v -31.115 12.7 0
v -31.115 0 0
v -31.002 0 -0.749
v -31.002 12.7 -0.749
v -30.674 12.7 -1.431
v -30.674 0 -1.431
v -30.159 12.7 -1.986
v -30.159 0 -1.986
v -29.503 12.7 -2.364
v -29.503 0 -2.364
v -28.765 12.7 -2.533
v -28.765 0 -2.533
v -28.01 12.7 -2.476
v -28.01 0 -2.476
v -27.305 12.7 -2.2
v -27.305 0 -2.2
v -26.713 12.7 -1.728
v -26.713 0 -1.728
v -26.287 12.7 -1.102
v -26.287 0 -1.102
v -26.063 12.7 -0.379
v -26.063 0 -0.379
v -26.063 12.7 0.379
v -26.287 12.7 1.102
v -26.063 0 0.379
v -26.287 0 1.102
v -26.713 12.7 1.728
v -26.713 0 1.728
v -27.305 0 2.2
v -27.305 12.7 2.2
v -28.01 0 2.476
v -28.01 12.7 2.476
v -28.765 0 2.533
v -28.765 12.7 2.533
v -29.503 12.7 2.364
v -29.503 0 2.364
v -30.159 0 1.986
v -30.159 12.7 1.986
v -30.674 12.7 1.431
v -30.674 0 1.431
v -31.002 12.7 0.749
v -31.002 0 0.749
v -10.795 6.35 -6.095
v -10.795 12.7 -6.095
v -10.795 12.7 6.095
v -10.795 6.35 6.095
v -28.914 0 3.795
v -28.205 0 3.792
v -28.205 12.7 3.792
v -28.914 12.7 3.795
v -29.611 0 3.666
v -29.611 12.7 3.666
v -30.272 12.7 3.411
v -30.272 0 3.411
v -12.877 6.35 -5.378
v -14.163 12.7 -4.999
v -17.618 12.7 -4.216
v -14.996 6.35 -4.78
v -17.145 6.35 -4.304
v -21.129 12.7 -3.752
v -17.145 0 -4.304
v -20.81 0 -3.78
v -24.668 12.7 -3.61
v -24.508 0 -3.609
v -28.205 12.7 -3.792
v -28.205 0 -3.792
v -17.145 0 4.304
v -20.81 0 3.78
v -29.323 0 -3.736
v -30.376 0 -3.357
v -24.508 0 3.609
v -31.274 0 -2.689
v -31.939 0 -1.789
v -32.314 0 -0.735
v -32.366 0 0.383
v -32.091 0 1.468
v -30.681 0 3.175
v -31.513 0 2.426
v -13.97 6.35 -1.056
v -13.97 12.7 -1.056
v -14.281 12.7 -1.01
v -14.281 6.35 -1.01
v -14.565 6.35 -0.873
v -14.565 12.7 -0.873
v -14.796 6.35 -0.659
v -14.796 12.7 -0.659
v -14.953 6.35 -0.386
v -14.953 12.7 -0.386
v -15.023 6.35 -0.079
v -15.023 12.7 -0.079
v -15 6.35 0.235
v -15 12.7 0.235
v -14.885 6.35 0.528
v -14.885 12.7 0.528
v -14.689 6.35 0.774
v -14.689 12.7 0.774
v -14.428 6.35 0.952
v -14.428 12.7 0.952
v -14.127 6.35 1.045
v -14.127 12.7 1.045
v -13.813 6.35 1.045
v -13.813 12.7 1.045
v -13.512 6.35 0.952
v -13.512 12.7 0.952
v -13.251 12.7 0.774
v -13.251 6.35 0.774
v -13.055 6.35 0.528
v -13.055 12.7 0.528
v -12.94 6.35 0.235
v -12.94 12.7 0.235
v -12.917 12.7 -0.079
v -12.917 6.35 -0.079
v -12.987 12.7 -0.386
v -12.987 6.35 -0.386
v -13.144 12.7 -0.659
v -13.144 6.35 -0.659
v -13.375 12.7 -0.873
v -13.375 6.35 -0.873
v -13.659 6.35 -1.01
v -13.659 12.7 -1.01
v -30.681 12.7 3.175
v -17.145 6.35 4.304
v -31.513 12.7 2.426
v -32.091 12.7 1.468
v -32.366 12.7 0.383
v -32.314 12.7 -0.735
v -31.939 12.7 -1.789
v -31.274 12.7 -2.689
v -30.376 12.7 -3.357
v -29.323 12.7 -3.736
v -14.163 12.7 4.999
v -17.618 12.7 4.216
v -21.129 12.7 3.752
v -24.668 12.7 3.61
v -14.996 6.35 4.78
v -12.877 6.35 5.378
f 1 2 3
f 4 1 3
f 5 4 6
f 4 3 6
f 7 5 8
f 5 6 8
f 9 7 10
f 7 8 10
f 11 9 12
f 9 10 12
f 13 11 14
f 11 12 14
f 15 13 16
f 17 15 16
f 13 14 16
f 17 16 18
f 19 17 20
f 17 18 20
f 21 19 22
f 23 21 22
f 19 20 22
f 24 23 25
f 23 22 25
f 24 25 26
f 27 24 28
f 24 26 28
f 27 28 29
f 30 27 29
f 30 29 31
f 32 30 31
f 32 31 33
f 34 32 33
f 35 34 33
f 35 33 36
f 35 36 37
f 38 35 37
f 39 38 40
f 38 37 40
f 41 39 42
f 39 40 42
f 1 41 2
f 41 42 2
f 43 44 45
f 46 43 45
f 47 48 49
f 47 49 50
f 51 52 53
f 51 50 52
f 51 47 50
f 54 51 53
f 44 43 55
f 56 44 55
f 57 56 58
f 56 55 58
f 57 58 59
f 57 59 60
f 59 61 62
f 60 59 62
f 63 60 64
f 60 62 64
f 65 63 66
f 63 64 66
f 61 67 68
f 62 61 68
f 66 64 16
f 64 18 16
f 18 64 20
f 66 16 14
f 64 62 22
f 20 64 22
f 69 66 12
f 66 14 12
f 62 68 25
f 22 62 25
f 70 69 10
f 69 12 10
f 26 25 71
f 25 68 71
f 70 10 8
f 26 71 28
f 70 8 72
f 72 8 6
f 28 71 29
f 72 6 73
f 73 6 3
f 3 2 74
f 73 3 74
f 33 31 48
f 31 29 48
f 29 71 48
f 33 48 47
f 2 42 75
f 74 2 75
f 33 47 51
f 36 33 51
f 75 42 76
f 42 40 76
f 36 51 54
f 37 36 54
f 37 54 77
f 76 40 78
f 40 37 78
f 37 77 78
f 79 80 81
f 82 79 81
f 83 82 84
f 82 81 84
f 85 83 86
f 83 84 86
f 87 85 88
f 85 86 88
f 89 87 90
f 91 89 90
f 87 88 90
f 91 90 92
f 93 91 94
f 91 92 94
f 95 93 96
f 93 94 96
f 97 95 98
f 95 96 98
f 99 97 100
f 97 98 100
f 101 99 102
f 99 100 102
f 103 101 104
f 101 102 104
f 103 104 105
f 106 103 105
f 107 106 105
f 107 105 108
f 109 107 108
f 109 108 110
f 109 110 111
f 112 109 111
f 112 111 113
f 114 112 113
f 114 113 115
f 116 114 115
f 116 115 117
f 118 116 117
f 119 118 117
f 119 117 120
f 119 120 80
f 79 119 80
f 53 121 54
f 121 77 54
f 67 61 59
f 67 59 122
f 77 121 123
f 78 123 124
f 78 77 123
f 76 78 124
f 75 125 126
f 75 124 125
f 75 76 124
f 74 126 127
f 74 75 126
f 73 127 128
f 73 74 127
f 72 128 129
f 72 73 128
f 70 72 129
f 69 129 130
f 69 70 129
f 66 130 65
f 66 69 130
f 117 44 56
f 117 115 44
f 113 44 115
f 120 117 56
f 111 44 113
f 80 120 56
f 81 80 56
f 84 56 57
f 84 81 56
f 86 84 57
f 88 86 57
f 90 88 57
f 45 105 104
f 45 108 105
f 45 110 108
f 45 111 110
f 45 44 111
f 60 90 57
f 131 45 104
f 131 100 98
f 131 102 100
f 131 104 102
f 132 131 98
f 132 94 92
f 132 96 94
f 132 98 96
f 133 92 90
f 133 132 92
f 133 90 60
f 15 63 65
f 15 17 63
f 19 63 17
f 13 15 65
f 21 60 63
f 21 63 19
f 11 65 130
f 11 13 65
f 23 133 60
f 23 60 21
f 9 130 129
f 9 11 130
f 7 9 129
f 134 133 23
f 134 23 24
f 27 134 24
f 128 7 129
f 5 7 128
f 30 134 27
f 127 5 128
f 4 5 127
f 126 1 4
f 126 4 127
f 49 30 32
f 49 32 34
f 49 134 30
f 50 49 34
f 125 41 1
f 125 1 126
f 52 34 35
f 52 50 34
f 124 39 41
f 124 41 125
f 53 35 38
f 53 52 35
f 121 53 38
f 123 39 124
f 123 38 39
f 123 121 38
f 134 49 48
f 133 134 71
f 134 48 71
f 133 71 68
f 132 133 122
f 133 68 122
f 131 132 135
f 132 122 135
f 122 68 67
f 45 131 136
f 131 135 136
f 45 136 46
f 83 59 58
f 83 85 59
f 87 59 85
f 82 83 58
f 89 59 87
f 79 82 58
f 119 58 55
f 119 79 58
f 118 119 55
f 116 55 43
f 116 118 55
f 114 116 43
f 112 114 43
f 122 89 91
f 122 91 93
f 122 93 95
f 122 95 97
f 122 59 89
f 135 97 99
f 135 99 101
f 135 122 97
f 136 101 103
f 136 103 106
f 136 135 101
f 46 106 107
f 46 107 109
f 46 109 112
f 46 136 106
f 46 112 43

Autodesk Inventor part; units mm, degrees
ref_plane "YZ Plane" through (0, 0, 0) normal (1, 0, 0) x (0, 1, 0)
ref_plane "XZ Plane" through (0, 0, 0) normal (0, 1, 0) x (-1, 0, 0)
ref_plane "XY Plane" through (0, 0, 0) normal (0, 0, 1) x (1, 0, 0)
sketch "Sketch1" plane through (0, 0, 0) normal (0, 1, 0) x (-1, 0, 0)
  line L0 (0, 0) -> (28.575, 0)
  line L1 (28.575, 0) -> (0, 0)
  line L2 (0, 0) -> (-14.2875, -24.7467)
  line L3 (0, 0) -> (28.575, 0) construction
  line L4 (0, 0) -> (-14.2875, 24.7467)
  line L5 (0, 0) -> (28.575, 0) construction
  circle A0 centre (28.575, 0) radius 2.54
  circle A1 centre (-14.2875, -24.7467) radius 2.54
  circle A2 centre (-14.2875, 24.7467) radius 2.54
  circle A3 centre (0, 0) radius 3.175
  circle A4 centre (0, 0) radius 6.35
  line L6 (-1.5875, -2.7496) -> (0, 0)
  line L7 (0, 0) -> (-6.35, 0)
  circle A5 centre (-14.2875, 24.7467) radius 3.81
  circle A6 centre (28.575, 0) radius 3.81
  circle A7 centre (-14.2875, -24.7467) radius 3.81
  line L8 (30.6811, 3.175) -> (-12.1814, 27.9217)
  line L9 (28.2054, -3.792) -> (-10.8187, -26.3226)
  line L10 (-18.0975, 24.7467) -> (-18.0975, -24.7467)
  line L11 (0, 0) -> (5.0525, -8.8146)
  line L12 (0, 0) -> (5.1463, 8.7602)
  line L13 (0, 0) -> (-10.16, 0)
  arc A8 (28.2054, -3.792) -> (-10.8187, -26.3226) centre (24.4473, -42.344) ccw
  arc A9 (-10.8187, 26.3226) -> (28.2054, 3.792) centre (24.4473, 42.344) ccw
  arc A10 (-17.3867, -22.5305) -> (-17.3867, 22.5305) centre (-48.8947, 0) ccw
  point P0 (5.1074, 8.7829)
  point P1 (-10.16, 0.0317)
  point P2 (30.2716, 3.4114)
  point P3 (28.2054, 3.792)
  point P4 (-10.8187, 26.3226)
  point P5 (-17.3867, 22.5305)
  point P6 (-17.3867, -22.5305)
  dimension "d9" = 6.35
  dimension "d41" = 12.7
  dimension "d0" = 28.575
  dimension "d1" = 28.575
  dimension "d2" = 120
  dimension "d3" = 28.575
  dimension "d4" = 120
  dimension "d5" = 5.08
  dimension "d6" = 5.08
  dimension "d7" = 5.08
  dimension "d42" = 7.62
  dimension "d43" = 7.62
  dimension "d44" = 7.62
  dimension "d47" = 10.16
  dimension "d48" = 10.16
  dimension "d49" = 10.16
  dimension "d52" = 360
extrude "Extrusion4" add sketch "Sketch1" along normal blind 12.7 contours A3 L12 A4 L0 | L0 A4 L11 A3 | A3 L11 A4 L2 | L2 A4 L7 A3 | A3 L7 A4 L4 | L4 A4 L12 A3 | A4 L12 A9 A6 L0 | L0 A6 A8 L11 A4 | A4 L11 A8 A7 L2 | L2 A7 A10 L13 A4 | A4 L13 A10 A5 L4 | L4 A5 A9 L12 A4 | A6 L8 | A7 | A5 picked at (31.8987, 0.5122)
sketch "Sketch21" plane through (0, 12.7, 0) normal (0, 1, 0) x (1, 0, 0)
  circle A0 centre (-28.575, 0) radius 2.54 projected
  arc A1 (-28.2054, 3.792) -> (10.8187, 26.3226) centre (-24.4473, 42.344) ccw projected
  arc A2 (10.8187, -26.3226) -> (-28.2054, -3.792) centre (-24.4473, -42.344) ccw projected
  arc A3 (-28.2054, 3.792) -> (10.8187, 26.3226) centre (-24.4473, 42.344) ccw projected
  arc A4 (-28.2054, 3.792) -> (-30.6811, -3.175) centre (-28.575, 0) ccw projected
  line L0 (-30.6811, -3.175) -> (-30.2716, -3.4114) projected
  arc A5 (-30.2716, -3.4114) -> (-28.2054, -3.792) centre (-28.575, 0) ccw projected
  arc A6 (10.8187, -26.3226) -> (-28.2054, -3.792) centre (-24.4473, -42.344) ccw projected
  arc A7 (10.8187, -26.3226) -> (17.3867, -22.5305) centre (14.2875, -24.7467) ccw projected
  arc A8 (17.3867, 22.5305) -> (17.3867, -22.5305) centre (48.8947, 0) ccw projected
  arc A9 (17.3867, 22.5305) -> (10.8187, 26.3226) centre (14.2875, 24.7467) ccw projected
  circle A10 centre (-28.575, 0) radius 2.54 projected
  circle A11 centre (0, 0) radius 3.175 projected
  circle A12 centre (14.2875, -24.7467) radius 2.54 projected
  circle A13 centre (14.2875, 24.7467) radius 2.54 projected
  line L1 (0, 0) -> (-13.6784, 0)
  line L2 (-13.6784, 0) -> (-28.575, 0)
  line L3 (0, 0) -> (-10.795, 0)
  line L4 (-10.795, 0) -> (-10.795, 6.095)
  arc A14 (-28.2054, 3.792) -> (10.8187, 26.3226) centre (-24.4473, 42.344) ccw projected
  line L5 (-10.795, 0) -> (-10.795, -6.095)
  point P0 (10.8187, -26.3226)
  point P1 (10.8187, 26.3226)
  dimension "d107" = 10.795
sketch "Sketch22" plane through (0, 0, 0) normal (0, -1, 0) x (1, 0, 0)
  line L0 (0, 0) -> (-17.145, 0)
  line L1 (-17.145, 0) -> (-17.145, -4.3038)
  arc A0 (10.8187, -26.3226) -> (-28.2054, -3.792) centre (-24.4473, -42.344) ccw projected
  line L2 (-17.145, 0) -> (-17.145, 4.3038)
  arc A1 (-28.2054, 3.792) -> (10.8187, 26.3226) centre (-24.4473, 42.344) ccw projected
  arc A2 (10.8187, -26.3226) -> (-28.2054, -3.792) centre (-24.4473, -42.344) ccw projected
  arc A3 (10.8187, -26.3226) -> (17.3867, -22.5305) centre (14.2875, -24.7467) ccw projected
  arc A4 (17.3867, 22.5305) -> (17.3867, -22.5305) centre (48.8947, 0) ccw projected
  arc A5 (17.3867, 22.5305) -> (10.8187, 26.3226) centre (14.2875, 24.7467) ccw projected
  arc A6 (-28.2054, 3.792) -> (10.8187, 26.3226) centre (-24.4473, 42.344) ccw projected
  arc A7 (-28.2054, 3.792) -> (-30.2716, 3.4114) centre (-28.575, 0) ccw projected
  line L3 (-30.6811, 3.175) -> (-30.2716, 3.4114) projected
  arc A8 (-30.6811, 3.175) -> (-28.2054, -3.792) centre (-28.575, 0) ccw projected
  circle A9 centre (-28.575, 0) radius 2.54 projected
  circle A10 centre (0, 0) radius 3.175 projected
  circle A11 centre (14.2875, 24.7467) radius 2.54 projected
  circle A12 centre (14.2875, -24.7467) radius 2.54 projected
  point P0 (10.8187, -26.3226)
  point P1 (10.8187, 26.3226)
  dimension "d108" = 17.145
extrude "Extrusion10" cut sketch "Sketch22" against normal blind 6.35 contours L2 A1 A5 A4 A3 A0 L1
extrude "Extrusion11" cut sketch "Sketch21" against normal blind 6.35 contours A1 A9 A8 A7 A2 L5 L4
sketch "Sketch23" plane through (0, 12.7, 0) normal (0, 1, 0) x (1, 0, 0)
  point P0 (0, 0)
sketch "Sketch24" plane through (0, 6.35, 0) normal (0, -1, 0) x (1, 0, 0)
  line L0 (-17.145, -4.3038) -> (-17.145, 4.3038) projected
  line L1 (-17.145, 0) -> (-10.795, 0)
  line L2 (-10.795, -6.095) -> (-10.795, 6.095) projected
  line L3 (-13.97, 0) -> (-13.97, 5.0532)
  arc A0 (-17.145, 4.3038) -> (-10.795, 6.095) centre (-24.4473, 42.344) ccw projected
  line L4 (-13.97, 0) -> (-13.97, -5.0532)
  arc A1 (-10.795, -6.095) -> (-17.145, -4.3038) centre (-24.4473, -42.344) ccw projected
  point P0 (0, 0)
hole "Hole8" at (-13.97, 6.35, 0) direction (0, 1, 0) diameter 2.1129 depth 7.7978 thread size "M2.6x0.45" class "6H" standard "ISO Metric profile"
properties part number "stability copy2"
